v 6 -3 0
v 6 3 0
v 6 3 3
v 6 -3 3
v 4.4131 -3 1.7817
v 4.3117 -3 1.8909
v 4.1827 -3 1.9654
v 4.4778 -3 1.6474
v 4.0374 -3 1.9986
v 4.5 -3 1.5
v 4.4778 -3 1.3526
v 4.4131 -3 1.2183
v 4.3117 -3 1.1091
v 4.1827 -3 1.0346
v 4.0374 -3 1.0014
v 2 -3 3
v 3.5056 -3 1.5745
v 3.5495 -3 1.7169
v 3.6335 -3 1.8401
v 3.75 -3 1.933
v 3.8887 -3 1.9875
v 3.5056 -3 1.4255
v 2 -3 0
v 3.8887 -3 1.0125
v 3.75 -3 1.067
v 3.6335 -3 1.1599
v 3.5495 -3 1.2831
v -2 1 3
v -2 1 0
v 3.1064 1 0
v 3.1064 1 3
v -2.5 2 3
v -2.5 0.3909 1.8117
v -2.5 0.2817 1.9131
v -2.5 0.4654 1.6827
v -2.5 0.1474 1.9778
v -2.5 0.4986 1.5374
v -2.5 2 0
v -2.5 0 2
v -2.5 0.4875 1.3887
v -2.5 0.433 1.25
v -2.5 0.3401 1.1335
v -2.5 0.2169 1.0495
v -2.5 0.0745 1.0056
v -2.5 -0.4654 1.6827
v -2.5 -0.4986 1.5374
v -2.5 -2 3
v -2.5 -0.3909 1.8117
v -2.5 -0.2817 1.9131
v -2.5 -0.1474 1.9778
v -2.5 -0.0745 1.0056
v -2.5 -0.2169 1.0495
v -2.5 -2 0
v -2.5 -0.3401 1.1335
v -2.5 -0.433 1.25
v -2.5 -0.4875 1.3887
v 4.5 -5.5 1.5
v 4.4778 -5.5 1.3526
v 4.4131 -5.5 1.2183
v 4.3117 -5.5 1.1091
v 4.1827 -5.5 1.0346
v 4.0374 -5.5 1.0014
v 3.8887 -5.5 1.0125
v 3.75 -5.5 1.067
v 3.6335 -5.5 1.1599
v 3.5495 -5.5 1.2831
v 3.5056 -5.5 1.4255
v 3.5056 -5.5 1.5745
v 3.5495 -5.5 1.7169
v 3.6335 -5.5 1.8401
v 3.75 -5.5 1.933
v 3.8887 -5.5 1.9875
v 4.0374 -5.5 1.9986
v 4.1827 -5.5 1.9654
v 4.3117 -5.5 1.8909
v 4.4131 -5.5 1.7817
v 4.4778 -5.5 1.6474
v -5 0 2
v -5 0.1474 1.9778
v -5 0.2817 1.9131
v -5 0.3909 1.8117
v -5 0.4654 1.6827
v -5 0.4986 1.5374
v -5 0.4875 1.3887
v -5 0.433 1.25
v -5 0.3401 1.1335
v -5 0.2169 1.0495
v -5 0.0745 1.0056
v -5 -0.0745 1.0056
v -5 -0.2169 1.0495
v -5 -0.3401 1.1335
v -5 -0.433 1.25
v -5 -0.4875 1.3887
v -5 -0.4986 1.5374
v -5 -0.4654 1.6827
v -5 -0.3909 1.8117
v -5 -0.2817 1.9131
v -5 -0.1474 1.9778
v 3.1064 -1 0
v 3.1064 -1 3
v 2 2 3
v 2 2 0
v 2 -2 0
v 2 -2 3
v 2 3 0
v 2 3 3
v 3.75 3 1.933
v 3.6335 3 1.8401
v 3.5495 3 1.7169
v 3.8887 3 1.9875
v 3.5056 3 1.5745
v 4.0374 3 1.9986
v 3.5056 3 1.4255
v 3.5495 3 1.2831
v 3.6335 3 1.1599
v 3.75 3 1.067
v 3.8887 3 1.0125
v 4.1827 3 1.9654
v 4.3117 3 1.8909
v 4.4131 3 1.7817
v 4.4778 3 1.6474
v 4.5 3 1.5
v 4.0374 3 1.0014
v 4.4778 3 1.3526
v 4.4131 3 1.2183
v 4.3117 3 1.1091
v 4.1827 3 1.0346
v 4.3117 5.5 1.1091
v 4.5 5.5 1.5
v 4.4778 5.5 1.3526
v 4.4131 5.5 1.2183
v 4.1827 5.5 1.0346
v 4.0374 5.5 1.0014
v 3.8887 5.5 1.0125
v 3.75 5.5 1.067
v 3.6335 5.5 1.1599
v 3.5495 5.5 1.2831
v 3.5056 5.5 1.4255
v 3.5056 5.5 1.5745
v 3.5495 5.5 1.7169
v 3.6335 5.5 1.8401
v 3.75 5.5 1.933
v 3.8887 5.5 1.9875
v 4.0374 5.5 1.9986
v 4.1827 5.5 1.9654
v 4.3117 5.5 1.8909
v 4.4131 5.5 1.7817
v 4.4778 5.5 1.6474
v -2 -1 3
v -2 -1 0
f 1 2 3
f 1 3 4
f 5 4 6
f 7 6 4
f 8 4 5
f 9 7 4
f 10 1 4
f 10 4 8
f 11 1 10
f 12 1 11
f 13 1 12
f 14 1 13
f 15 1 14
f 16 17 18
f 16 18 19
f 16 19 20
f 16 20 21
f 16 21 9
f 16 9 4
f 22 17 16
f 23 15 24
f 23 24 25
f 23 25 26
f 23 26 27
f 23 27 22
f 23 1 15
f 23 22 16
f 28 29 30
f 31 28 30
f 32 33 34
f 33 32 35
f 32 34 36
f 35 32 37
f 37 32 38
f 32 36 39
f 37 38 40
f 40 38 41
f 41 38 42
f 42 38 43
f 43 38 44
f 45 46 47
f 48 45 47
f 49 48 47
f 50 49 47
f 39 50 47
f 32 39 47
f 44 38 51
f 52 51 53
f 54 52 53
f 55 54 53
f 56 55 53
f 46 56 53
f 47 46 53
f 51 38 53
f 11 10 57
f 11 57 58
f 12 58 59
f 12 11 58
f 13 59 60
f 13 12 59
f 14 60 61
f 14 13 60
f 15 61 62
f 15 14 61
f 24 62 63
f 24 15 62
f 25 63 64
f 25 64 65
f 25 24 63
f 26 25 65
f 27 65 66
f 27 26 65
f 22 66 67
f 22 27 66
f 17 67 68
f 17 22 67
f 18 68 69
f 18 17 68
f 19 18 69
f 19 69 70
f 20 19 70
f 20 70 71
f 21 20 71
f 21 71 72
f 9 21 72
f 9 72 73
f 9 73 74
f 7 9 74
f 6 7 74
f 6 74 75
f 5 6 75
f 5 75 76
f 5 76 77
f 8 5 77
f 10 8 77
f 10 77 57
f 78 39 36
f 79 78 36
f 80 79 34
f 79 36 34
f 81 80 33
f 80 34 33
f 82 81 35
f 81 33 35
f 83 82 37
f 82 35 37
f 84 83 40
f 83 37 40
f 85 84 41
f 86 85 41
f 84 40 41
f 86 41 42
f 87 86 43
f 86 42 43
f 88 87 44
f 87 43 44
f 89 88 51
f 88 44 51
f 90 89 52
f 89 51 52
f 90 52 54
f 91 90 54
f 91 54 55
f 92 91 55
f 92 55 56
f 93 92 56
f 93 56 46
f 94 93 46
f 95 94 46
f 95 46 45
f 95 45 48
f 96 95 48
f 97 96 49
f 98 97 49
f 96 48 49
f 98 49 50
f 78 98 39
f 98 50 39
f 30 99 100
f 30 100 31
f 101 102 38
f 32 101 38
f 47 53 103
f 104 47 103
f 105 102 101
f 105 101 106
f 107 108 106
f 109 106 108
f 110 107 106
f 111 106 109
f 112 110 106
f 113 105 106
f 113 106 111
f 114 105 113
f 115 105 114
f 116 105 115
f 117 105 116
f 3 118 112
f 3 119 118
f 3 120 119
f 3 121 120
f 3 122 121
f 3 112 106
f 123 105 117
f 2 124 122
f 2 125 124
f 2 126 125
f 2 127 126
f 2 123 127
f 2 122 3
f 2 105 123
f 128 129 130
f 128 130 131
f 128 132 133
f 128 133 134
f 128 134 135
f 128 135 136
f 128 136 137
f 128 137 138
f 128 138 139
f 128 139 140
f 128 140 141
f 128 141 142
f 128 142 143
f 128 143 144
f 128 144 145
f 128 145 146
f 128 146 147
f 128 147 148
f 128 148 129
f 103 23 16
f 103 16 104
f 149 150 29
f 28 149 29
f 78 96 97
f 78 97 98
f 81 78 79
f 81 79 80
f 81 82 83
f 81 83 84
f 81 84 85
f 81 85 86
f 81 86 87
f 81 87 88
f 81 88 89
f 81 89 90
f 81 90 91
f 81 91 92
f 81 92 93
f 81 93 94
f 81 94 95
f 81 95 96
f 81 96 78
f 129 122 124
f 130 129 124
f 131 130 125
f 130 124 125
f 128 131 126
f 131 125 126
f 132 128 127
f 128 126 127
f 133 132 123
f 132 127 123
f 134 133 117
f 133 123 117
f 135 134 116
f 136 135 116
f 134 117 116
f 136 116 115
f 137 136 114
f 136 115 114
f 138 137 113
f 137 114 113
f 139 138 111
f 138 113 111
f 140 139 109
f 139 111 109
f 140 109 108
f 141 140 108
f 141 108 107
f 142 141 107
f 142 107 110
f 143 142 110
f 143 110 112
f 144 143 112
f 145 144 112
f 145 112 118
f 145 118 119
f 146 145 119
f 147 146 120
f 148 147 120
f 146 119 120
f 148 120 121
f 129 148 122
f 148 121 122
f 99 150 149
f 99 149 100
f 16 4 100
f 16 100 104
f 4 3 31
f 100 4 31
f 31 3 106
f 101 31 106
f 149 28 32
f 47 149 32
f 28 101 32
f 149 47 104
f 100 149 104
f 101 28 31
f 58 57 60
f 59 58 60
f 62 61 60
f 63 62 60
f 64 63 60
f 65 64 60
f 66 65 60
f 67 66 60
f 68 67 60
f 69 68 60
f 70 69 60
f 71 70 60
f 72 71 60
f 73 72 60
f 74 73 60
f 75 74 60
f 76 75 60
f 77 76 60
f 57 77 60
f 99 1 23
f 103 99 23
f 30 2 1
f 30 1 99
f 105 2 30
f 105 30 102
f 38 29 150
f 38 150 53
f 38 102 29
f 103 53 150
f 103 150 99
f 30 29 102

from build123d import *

# Parameters (mm, degrees)
CROQUIS1_W                   = 5.106382979
CROQUIS1_H                   = 2
SALIENTE_EXTRUIR1_DEPTH      = 3
CROQUIS2_R                   = 0.5
SALIENTE_EXTRUIR2_DEPTH      = 2.5
SALIENTE_EXTRUIR2_DEPTH_BACK = 8.5
CROQUIS3_R                   = 0.5
SALIENTE_EXTRUIR3_DEPTH      = 2.5


with BuildPart() as part:
    # Croquis1 → Saliente-Extruir1 (new body)
    with BuildSketch(Plane.XY):
        Polygon((-2, 2), (2, 2), (2, 3), (6, 3), (6, -3), (2, -3), (2, -2), (-2, -2), (-2.5, -2), (-2.5, -0.496453901), (-2.5, 0.503546099), (-2.5, 2), align=None)
        with Locations((0.55319149, 0)):
            Rectangle(CROQUIS1_W, CROQUIS1_H, mode=Mode.SUBTRACT)
    extrude(amount=SALIENTE_EXTRUIR1_DEPTH)

    # Croquis2 → Saliente-Extruir2 (add, two sides)
    with BuildSketch(Plane(origin=(0, 3, 0), x_dir=(1, 0, 0), z_dir=(0, 1, 0))) as saliente_extruir2_sk:
        with Locations((4, -1.5)):
            Circle(CROQUIS2_R)
    extrude(amount=SALIENTE_EXTRUIR2_DEPTH)
    extrude(saliente_extruir2_sk.sketch, amount=-SALIENTE_EXTRUIR2_DEPTH_BACK)

    # Croquis3 → Saliente-Extruir3 (add)
    with BuildSketch(Plane.ZY.offset(2.5)):
        with Locations((1.5, 0)):
            Circle(CROQUIS3_R)
    extrude(amount=SALIENTE_EXTRUIR3_DEPTH)


solid = part.part
